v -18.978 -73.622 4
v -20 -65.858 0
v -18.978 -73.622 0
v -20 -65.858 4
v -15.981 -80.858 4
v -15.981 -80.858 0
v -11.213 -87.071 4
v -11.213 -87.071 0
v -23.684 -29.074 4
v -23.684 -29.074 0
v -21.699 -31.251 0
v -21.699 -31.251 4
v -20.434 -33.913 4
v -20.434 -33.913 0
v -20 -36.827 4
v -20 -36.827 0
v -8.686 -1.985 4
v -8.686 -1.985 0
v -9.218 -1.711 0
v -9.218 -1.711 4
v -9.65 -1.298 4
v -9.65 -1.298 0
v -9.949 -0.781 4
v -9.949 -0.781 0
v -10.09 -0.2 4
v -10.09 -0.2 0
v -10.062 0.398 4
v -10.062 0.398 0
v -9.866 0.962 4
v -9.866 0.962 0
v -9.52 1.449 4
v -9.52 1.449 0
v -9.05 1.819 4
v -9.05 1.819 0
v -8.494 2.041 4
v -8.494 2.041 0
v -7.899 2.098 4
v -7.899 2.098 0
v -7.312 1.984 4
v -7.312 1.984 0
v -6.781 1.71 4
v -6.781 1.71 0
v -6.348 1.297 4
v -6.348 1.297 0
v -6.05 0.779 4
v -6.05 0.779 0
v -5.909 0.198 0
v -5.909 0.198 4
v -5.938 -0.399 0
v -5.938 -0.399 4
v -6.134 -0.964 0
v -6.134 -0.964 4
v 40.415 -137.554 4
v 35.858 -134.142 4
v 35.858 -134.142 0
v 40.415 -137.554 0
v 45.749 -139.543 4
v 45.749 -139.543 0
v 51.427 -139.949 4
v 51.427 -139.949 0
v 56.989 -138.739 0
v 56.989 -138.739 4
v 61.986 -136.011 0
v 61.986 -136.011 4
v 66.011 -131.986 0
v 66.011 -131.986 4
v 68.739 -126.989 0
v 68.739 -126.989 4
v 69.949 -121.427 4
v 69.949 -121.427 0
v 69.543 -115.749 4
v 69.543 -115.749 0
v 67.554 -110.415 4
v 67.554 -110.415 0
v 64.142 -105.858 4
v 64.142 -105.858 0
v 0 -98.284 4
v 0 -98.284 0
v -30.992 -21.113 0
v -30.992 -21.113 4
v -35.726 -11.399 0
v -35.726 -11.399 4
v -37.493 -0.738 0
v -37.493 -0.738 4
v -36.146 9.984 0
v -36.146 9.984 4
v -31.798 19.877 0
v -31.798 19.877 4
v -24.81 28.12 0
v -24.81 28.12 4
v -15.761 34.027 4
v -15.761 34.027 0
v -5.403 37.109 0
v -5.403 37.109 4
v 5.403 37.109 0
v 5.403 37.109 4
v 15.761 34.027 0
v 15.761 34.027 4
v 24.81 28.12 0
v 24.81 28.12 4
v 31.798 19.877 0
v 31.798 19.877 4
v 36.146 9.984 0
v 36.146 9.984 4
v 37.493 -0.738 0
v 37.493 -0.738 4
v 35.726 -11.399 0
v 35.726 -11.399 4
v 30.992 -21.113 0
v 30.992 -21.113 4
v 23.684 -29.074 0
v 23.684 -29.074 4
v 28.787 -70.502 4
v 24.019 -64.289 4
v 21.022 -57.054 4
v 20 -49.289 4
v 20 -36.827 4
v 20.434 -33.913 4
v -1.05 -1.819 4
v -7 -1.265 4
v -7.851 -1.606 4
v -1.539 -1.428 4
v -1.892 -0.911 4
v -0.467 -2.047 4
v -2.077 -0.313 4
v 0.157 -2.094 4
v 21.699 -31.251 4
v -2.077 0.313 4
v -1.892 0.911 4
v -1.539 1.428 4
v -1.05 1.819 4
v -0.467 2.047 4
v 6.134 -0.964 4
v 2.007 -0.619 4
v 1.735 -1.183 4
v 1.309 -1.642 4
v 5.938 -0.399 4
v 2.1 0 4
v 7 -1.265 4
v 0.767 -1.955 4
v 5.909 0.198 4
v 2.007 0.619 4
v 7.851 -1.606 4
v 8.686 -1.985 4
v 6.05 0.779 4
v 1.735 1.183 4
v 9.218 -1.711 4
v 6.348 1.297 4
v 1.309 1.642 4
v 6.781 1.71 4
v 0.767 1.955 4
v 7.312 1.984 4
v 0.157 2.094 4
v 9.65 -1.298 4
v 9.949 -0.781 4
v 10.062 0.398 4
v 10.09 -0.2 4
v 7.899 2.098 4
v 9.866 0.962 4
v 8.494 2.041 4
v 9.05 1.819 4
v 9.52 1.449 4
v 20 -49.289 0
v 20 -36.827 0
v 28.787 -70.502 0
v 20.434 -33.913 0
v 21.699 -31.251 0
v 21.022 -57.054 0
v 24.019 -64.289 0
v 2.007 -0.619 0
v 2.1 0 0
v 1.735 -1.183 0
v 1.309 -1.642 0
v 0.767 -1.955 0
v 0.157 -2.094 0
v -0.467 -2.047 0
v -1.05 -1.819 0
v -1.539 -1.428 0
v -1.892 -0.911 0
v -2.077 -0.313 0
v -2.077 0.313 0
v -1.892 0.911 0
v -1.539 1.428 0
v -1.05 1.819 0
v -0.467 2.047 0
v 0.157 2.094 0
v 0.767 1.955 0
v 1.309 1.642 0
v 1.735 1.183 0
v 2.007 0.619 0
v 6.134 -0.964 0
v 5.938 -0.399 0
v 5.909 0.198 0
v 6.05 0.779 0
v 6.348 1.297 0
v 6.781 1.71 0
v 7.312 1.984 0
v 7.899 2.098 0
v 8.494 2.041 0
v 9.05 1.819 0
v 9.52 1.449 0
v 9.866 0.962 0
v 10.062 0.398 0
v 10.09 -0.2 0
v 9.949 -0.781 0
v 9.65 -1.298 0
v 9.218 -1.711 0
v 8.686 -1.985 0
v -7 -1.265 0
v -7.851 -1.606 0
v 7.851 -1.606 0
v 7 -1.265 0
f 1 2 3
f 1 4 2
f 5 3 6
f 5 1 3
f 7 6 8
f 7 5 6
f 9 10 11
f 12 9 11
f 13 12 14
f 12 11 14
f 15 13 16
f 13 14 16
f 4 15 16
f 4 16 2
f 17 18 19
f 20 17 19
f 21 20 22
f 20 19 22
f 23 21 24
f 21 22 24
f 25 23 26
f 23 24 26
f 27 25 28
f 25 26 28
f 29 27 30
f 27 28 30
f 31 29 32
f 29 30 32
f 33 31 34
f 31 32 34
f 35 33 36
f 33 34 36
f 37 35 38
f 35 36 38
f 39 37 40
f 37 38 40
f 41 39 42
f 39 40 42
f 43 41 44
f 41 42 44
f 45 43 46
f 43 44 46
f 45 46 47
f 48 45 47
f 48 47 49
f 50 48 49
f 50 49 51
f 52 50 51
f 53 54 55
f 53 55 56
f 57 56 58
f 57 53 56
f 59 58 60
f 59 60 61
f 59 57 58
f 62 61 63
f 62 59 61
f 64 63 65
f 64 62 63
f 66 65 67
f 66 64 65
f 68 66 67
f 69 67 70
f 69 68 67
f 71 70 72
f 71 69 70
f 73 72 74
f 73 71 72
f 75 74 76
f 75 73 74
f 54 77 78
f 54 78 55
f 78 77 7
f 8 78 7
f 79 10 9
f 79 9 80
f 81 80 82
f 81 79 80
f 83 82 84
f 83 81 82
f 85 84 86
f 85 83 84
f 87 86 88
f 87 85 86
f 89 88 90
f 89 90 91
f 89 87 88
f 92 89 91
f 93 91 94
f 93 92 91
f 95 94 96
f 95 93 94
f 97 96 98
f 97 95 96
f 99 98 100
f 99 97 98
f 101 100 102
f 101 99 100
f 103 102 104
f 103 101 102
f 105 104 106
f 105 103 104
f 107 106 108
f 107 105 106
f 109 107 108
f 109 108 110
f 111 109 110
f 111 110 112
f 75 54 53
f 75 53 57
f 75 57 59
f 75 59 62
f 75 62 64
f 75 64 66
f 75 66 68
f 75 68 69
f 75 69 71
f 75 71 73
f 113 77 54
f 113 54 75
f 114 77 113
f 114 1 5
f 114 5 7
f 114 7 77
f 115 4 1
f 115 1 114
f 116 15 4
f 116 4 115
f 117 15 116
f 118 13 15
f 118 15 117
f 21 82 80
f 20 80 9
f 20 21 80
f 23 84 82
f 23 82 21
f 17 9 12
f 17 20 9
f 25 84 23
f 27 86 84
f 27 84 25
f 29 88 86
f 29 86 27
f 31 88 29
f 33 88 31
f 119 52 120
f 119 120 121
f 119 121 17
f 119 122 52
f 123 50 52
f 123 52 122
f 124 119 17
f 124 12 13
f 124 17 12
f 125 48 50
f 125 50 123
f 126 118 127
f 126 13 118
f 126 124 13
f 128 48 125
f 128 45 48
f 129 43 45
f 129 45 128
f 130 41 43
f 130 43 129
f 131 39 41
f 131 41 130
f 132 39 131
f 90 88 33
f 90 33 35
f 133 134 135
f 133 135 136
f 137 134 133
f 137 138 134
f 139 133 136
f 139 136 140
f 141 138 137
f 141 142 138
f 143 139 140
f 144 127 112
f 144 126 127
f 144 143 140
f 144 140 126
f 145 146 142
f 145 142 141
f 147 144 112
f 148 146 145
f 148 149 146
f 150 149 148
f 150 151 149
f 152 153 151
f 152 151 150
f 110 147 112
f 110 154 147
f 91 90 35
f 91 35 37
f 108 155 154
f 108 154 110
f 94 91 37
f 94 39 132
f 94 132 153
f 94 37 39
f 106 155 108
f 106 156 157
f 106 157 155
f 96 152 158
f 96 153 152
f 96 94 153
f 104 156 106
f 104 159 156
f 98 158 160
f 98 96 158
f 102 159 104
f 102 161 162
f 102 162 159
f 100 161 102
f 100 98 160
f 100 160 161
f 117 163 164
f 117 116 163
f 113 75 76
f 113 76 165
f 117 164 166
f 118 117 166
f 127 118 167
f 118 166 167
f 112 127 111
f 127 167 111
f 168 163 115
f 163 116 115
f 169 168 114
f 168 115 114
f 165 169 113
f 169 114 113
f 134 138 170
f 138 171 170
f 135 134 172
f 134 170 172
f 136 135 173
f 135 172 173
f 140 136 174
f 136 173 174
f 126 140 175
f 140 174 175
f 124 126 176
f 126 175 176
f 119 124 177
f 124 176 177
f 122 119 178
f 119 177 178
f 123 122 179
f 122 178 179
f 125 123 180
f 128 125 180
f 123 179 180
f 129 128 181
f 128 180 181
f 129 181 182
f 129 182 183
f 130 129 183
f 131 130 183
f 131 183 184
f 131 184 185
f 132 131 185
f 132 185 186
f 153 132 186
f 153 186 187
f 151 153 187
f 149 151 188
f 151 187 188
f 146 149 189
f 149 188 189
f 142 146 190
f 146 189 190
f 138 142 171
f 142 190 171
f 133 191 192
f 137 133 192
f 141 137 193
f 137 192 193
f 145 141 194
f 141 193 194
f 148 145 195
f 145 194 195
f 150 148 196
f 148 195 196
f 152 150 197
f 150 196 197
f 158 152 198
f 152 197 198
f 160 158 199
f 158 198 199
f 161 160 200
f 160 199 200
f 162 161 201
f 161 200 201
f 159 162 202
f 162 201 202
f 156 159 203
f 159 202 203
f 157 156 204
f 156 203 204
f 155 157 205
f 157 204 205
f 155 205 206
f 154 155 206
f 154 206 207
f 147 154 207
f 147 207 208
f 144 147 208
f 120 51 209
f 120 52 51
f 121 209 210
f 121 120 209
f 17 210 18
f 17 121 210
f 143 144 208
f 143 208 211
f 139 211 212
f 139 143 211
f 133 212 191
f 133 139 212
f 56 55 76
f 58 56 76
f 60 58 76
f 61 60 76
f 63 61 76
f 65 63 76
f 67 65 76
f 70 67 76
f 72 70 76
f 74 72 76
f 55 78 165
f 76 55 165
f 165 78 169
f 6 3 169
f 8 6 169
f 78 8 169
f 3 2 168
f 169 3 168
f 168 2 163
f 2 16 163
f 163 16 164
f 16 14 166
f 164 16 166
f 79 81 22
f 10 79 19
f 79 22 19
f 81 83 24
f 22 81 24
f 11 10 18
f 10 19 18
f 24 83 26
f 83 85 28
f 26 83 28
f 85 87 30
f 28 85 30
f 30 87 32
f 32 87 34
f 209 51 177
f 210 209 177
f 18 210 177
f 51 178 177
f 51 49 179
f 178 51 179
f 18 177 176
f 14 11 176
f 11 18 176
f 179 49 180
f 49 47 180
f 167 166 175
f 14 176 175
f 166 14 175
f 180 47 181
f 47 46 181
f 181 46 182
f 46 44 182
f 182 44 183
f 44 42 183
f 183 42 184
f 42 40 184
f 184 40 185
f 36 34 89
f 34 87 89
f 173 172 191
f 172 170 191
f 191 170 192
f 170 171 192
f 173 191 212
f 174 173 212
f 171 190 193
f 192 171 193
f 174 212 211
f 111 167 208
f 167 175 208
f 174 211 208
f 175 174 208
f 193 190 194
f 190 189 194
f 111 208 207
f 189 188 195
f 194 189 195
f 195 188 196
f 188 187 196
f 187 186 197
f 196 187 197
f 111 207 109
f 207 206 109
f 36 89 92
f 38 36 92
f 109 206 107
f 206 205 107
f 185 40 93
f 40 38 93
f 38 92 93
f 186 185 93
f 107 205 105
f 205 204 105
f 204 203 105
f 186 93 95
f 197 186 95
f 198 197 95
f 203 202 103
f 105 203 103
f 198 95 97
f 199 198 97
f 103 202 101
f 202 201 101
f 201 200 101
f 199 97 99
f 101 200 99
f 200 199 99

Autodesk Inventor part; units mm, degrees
ref_plane "YZ Plane" through (0, 0, 0) normal (1, 0, 0) x (0, 1, 0)
ref_plane "XZ Plane" through (0, 0, 0) normal (0, 1, 0) x (-1, 0, 0)
ref_plane "XY Plane" through (0, 0, 0) normal (0, 0, 1) x (1, 0, 0)
sketch "Эскиз1" plane through (0, 0, 0) normal (0, 0, 1) x (1, 0, 0)
  circle A0 centre (0, 0) radius 37.5
  circle A1 centre (0, 0) radius 2.1
  circle A2 centre (-8, 0) radius 2.1
  circle A3 centre (8, 0) radius 2.1
  line L0 (0, 0) -> (21.2822, 0) construction
  line L1 (0, 0) -> (-18.9176, 0) construction
  dimension "d0" = 75
  dimension "d1" = 4.2
  dimension "d2" = 4.2
  dimension "d3" = 4.2
  dimension "d4" = 8
  dimension "d5" = 8
extrude "Выдавливание1" add sketch "Эскиз1" along normal blind 4
sketch "Эскиз2" plane through (0, 0, 4) normal (0, 0, 1) x (1, 0, 0)
  circle A0 centre (0, 0) radius 2.1 projected
  line L0 (0, 0) -> (0, -140) construction
  line L1 (-20, -20) -> (-20, -65.8579)
  arc A1 (20, -20) -> (-20, -20) centre (0, -20) ccw
  line L2 (0, -70) -> (64.1421, -134.1421) construction
  line L3 (0, -98.2843) -> (35.8579, -134.1421)
  line L4 (64.1421, -105.8579) -> (28.2843, -70)
  arc A2 (35.8579, -134.1421) -> (64.1421, -105.8579) centre (50, -120) ccw
  line L5 (0, -70) -> (90.7107, -70) construction
  line L6 (0, -140) -> (114.1632, -140) construction
  line L7 (0, -98.2843) -> (-11.2132, -87.0711)
  arc A3 (-20, -65.8579) -> (-11.2132, -87.0711) centre (10, -65.8579) ccw
  line L8 (28.2843, -70) -> (28.7868, -70.5025)
  line L9 (20, -49.2893) -> (20, -20)
  arc A4 (20, -49.2893) -> (28.7868, -70.5025) centre (50, -49.2893) ccw
  point P0 (32.0711, -102.0711)
  point P1 (2.0971, -0.1103)
  point P2 (-2.0971, -0.1102)
  dimension "d19" = 45
  dimension "d20" = 40
  dimension "d21" = 30
  dimension "d22" = 30
extrude "Выдавливание2" add sketch "Эскиз2" against normal blind 4 contours A0 A1 L9 A4 L4 A2 L3 L7 A3 L1
fillet "Сопряжение1" radius 10 2 edges at (-20, -31.7214, 2) (20, -31.7214, 2)
